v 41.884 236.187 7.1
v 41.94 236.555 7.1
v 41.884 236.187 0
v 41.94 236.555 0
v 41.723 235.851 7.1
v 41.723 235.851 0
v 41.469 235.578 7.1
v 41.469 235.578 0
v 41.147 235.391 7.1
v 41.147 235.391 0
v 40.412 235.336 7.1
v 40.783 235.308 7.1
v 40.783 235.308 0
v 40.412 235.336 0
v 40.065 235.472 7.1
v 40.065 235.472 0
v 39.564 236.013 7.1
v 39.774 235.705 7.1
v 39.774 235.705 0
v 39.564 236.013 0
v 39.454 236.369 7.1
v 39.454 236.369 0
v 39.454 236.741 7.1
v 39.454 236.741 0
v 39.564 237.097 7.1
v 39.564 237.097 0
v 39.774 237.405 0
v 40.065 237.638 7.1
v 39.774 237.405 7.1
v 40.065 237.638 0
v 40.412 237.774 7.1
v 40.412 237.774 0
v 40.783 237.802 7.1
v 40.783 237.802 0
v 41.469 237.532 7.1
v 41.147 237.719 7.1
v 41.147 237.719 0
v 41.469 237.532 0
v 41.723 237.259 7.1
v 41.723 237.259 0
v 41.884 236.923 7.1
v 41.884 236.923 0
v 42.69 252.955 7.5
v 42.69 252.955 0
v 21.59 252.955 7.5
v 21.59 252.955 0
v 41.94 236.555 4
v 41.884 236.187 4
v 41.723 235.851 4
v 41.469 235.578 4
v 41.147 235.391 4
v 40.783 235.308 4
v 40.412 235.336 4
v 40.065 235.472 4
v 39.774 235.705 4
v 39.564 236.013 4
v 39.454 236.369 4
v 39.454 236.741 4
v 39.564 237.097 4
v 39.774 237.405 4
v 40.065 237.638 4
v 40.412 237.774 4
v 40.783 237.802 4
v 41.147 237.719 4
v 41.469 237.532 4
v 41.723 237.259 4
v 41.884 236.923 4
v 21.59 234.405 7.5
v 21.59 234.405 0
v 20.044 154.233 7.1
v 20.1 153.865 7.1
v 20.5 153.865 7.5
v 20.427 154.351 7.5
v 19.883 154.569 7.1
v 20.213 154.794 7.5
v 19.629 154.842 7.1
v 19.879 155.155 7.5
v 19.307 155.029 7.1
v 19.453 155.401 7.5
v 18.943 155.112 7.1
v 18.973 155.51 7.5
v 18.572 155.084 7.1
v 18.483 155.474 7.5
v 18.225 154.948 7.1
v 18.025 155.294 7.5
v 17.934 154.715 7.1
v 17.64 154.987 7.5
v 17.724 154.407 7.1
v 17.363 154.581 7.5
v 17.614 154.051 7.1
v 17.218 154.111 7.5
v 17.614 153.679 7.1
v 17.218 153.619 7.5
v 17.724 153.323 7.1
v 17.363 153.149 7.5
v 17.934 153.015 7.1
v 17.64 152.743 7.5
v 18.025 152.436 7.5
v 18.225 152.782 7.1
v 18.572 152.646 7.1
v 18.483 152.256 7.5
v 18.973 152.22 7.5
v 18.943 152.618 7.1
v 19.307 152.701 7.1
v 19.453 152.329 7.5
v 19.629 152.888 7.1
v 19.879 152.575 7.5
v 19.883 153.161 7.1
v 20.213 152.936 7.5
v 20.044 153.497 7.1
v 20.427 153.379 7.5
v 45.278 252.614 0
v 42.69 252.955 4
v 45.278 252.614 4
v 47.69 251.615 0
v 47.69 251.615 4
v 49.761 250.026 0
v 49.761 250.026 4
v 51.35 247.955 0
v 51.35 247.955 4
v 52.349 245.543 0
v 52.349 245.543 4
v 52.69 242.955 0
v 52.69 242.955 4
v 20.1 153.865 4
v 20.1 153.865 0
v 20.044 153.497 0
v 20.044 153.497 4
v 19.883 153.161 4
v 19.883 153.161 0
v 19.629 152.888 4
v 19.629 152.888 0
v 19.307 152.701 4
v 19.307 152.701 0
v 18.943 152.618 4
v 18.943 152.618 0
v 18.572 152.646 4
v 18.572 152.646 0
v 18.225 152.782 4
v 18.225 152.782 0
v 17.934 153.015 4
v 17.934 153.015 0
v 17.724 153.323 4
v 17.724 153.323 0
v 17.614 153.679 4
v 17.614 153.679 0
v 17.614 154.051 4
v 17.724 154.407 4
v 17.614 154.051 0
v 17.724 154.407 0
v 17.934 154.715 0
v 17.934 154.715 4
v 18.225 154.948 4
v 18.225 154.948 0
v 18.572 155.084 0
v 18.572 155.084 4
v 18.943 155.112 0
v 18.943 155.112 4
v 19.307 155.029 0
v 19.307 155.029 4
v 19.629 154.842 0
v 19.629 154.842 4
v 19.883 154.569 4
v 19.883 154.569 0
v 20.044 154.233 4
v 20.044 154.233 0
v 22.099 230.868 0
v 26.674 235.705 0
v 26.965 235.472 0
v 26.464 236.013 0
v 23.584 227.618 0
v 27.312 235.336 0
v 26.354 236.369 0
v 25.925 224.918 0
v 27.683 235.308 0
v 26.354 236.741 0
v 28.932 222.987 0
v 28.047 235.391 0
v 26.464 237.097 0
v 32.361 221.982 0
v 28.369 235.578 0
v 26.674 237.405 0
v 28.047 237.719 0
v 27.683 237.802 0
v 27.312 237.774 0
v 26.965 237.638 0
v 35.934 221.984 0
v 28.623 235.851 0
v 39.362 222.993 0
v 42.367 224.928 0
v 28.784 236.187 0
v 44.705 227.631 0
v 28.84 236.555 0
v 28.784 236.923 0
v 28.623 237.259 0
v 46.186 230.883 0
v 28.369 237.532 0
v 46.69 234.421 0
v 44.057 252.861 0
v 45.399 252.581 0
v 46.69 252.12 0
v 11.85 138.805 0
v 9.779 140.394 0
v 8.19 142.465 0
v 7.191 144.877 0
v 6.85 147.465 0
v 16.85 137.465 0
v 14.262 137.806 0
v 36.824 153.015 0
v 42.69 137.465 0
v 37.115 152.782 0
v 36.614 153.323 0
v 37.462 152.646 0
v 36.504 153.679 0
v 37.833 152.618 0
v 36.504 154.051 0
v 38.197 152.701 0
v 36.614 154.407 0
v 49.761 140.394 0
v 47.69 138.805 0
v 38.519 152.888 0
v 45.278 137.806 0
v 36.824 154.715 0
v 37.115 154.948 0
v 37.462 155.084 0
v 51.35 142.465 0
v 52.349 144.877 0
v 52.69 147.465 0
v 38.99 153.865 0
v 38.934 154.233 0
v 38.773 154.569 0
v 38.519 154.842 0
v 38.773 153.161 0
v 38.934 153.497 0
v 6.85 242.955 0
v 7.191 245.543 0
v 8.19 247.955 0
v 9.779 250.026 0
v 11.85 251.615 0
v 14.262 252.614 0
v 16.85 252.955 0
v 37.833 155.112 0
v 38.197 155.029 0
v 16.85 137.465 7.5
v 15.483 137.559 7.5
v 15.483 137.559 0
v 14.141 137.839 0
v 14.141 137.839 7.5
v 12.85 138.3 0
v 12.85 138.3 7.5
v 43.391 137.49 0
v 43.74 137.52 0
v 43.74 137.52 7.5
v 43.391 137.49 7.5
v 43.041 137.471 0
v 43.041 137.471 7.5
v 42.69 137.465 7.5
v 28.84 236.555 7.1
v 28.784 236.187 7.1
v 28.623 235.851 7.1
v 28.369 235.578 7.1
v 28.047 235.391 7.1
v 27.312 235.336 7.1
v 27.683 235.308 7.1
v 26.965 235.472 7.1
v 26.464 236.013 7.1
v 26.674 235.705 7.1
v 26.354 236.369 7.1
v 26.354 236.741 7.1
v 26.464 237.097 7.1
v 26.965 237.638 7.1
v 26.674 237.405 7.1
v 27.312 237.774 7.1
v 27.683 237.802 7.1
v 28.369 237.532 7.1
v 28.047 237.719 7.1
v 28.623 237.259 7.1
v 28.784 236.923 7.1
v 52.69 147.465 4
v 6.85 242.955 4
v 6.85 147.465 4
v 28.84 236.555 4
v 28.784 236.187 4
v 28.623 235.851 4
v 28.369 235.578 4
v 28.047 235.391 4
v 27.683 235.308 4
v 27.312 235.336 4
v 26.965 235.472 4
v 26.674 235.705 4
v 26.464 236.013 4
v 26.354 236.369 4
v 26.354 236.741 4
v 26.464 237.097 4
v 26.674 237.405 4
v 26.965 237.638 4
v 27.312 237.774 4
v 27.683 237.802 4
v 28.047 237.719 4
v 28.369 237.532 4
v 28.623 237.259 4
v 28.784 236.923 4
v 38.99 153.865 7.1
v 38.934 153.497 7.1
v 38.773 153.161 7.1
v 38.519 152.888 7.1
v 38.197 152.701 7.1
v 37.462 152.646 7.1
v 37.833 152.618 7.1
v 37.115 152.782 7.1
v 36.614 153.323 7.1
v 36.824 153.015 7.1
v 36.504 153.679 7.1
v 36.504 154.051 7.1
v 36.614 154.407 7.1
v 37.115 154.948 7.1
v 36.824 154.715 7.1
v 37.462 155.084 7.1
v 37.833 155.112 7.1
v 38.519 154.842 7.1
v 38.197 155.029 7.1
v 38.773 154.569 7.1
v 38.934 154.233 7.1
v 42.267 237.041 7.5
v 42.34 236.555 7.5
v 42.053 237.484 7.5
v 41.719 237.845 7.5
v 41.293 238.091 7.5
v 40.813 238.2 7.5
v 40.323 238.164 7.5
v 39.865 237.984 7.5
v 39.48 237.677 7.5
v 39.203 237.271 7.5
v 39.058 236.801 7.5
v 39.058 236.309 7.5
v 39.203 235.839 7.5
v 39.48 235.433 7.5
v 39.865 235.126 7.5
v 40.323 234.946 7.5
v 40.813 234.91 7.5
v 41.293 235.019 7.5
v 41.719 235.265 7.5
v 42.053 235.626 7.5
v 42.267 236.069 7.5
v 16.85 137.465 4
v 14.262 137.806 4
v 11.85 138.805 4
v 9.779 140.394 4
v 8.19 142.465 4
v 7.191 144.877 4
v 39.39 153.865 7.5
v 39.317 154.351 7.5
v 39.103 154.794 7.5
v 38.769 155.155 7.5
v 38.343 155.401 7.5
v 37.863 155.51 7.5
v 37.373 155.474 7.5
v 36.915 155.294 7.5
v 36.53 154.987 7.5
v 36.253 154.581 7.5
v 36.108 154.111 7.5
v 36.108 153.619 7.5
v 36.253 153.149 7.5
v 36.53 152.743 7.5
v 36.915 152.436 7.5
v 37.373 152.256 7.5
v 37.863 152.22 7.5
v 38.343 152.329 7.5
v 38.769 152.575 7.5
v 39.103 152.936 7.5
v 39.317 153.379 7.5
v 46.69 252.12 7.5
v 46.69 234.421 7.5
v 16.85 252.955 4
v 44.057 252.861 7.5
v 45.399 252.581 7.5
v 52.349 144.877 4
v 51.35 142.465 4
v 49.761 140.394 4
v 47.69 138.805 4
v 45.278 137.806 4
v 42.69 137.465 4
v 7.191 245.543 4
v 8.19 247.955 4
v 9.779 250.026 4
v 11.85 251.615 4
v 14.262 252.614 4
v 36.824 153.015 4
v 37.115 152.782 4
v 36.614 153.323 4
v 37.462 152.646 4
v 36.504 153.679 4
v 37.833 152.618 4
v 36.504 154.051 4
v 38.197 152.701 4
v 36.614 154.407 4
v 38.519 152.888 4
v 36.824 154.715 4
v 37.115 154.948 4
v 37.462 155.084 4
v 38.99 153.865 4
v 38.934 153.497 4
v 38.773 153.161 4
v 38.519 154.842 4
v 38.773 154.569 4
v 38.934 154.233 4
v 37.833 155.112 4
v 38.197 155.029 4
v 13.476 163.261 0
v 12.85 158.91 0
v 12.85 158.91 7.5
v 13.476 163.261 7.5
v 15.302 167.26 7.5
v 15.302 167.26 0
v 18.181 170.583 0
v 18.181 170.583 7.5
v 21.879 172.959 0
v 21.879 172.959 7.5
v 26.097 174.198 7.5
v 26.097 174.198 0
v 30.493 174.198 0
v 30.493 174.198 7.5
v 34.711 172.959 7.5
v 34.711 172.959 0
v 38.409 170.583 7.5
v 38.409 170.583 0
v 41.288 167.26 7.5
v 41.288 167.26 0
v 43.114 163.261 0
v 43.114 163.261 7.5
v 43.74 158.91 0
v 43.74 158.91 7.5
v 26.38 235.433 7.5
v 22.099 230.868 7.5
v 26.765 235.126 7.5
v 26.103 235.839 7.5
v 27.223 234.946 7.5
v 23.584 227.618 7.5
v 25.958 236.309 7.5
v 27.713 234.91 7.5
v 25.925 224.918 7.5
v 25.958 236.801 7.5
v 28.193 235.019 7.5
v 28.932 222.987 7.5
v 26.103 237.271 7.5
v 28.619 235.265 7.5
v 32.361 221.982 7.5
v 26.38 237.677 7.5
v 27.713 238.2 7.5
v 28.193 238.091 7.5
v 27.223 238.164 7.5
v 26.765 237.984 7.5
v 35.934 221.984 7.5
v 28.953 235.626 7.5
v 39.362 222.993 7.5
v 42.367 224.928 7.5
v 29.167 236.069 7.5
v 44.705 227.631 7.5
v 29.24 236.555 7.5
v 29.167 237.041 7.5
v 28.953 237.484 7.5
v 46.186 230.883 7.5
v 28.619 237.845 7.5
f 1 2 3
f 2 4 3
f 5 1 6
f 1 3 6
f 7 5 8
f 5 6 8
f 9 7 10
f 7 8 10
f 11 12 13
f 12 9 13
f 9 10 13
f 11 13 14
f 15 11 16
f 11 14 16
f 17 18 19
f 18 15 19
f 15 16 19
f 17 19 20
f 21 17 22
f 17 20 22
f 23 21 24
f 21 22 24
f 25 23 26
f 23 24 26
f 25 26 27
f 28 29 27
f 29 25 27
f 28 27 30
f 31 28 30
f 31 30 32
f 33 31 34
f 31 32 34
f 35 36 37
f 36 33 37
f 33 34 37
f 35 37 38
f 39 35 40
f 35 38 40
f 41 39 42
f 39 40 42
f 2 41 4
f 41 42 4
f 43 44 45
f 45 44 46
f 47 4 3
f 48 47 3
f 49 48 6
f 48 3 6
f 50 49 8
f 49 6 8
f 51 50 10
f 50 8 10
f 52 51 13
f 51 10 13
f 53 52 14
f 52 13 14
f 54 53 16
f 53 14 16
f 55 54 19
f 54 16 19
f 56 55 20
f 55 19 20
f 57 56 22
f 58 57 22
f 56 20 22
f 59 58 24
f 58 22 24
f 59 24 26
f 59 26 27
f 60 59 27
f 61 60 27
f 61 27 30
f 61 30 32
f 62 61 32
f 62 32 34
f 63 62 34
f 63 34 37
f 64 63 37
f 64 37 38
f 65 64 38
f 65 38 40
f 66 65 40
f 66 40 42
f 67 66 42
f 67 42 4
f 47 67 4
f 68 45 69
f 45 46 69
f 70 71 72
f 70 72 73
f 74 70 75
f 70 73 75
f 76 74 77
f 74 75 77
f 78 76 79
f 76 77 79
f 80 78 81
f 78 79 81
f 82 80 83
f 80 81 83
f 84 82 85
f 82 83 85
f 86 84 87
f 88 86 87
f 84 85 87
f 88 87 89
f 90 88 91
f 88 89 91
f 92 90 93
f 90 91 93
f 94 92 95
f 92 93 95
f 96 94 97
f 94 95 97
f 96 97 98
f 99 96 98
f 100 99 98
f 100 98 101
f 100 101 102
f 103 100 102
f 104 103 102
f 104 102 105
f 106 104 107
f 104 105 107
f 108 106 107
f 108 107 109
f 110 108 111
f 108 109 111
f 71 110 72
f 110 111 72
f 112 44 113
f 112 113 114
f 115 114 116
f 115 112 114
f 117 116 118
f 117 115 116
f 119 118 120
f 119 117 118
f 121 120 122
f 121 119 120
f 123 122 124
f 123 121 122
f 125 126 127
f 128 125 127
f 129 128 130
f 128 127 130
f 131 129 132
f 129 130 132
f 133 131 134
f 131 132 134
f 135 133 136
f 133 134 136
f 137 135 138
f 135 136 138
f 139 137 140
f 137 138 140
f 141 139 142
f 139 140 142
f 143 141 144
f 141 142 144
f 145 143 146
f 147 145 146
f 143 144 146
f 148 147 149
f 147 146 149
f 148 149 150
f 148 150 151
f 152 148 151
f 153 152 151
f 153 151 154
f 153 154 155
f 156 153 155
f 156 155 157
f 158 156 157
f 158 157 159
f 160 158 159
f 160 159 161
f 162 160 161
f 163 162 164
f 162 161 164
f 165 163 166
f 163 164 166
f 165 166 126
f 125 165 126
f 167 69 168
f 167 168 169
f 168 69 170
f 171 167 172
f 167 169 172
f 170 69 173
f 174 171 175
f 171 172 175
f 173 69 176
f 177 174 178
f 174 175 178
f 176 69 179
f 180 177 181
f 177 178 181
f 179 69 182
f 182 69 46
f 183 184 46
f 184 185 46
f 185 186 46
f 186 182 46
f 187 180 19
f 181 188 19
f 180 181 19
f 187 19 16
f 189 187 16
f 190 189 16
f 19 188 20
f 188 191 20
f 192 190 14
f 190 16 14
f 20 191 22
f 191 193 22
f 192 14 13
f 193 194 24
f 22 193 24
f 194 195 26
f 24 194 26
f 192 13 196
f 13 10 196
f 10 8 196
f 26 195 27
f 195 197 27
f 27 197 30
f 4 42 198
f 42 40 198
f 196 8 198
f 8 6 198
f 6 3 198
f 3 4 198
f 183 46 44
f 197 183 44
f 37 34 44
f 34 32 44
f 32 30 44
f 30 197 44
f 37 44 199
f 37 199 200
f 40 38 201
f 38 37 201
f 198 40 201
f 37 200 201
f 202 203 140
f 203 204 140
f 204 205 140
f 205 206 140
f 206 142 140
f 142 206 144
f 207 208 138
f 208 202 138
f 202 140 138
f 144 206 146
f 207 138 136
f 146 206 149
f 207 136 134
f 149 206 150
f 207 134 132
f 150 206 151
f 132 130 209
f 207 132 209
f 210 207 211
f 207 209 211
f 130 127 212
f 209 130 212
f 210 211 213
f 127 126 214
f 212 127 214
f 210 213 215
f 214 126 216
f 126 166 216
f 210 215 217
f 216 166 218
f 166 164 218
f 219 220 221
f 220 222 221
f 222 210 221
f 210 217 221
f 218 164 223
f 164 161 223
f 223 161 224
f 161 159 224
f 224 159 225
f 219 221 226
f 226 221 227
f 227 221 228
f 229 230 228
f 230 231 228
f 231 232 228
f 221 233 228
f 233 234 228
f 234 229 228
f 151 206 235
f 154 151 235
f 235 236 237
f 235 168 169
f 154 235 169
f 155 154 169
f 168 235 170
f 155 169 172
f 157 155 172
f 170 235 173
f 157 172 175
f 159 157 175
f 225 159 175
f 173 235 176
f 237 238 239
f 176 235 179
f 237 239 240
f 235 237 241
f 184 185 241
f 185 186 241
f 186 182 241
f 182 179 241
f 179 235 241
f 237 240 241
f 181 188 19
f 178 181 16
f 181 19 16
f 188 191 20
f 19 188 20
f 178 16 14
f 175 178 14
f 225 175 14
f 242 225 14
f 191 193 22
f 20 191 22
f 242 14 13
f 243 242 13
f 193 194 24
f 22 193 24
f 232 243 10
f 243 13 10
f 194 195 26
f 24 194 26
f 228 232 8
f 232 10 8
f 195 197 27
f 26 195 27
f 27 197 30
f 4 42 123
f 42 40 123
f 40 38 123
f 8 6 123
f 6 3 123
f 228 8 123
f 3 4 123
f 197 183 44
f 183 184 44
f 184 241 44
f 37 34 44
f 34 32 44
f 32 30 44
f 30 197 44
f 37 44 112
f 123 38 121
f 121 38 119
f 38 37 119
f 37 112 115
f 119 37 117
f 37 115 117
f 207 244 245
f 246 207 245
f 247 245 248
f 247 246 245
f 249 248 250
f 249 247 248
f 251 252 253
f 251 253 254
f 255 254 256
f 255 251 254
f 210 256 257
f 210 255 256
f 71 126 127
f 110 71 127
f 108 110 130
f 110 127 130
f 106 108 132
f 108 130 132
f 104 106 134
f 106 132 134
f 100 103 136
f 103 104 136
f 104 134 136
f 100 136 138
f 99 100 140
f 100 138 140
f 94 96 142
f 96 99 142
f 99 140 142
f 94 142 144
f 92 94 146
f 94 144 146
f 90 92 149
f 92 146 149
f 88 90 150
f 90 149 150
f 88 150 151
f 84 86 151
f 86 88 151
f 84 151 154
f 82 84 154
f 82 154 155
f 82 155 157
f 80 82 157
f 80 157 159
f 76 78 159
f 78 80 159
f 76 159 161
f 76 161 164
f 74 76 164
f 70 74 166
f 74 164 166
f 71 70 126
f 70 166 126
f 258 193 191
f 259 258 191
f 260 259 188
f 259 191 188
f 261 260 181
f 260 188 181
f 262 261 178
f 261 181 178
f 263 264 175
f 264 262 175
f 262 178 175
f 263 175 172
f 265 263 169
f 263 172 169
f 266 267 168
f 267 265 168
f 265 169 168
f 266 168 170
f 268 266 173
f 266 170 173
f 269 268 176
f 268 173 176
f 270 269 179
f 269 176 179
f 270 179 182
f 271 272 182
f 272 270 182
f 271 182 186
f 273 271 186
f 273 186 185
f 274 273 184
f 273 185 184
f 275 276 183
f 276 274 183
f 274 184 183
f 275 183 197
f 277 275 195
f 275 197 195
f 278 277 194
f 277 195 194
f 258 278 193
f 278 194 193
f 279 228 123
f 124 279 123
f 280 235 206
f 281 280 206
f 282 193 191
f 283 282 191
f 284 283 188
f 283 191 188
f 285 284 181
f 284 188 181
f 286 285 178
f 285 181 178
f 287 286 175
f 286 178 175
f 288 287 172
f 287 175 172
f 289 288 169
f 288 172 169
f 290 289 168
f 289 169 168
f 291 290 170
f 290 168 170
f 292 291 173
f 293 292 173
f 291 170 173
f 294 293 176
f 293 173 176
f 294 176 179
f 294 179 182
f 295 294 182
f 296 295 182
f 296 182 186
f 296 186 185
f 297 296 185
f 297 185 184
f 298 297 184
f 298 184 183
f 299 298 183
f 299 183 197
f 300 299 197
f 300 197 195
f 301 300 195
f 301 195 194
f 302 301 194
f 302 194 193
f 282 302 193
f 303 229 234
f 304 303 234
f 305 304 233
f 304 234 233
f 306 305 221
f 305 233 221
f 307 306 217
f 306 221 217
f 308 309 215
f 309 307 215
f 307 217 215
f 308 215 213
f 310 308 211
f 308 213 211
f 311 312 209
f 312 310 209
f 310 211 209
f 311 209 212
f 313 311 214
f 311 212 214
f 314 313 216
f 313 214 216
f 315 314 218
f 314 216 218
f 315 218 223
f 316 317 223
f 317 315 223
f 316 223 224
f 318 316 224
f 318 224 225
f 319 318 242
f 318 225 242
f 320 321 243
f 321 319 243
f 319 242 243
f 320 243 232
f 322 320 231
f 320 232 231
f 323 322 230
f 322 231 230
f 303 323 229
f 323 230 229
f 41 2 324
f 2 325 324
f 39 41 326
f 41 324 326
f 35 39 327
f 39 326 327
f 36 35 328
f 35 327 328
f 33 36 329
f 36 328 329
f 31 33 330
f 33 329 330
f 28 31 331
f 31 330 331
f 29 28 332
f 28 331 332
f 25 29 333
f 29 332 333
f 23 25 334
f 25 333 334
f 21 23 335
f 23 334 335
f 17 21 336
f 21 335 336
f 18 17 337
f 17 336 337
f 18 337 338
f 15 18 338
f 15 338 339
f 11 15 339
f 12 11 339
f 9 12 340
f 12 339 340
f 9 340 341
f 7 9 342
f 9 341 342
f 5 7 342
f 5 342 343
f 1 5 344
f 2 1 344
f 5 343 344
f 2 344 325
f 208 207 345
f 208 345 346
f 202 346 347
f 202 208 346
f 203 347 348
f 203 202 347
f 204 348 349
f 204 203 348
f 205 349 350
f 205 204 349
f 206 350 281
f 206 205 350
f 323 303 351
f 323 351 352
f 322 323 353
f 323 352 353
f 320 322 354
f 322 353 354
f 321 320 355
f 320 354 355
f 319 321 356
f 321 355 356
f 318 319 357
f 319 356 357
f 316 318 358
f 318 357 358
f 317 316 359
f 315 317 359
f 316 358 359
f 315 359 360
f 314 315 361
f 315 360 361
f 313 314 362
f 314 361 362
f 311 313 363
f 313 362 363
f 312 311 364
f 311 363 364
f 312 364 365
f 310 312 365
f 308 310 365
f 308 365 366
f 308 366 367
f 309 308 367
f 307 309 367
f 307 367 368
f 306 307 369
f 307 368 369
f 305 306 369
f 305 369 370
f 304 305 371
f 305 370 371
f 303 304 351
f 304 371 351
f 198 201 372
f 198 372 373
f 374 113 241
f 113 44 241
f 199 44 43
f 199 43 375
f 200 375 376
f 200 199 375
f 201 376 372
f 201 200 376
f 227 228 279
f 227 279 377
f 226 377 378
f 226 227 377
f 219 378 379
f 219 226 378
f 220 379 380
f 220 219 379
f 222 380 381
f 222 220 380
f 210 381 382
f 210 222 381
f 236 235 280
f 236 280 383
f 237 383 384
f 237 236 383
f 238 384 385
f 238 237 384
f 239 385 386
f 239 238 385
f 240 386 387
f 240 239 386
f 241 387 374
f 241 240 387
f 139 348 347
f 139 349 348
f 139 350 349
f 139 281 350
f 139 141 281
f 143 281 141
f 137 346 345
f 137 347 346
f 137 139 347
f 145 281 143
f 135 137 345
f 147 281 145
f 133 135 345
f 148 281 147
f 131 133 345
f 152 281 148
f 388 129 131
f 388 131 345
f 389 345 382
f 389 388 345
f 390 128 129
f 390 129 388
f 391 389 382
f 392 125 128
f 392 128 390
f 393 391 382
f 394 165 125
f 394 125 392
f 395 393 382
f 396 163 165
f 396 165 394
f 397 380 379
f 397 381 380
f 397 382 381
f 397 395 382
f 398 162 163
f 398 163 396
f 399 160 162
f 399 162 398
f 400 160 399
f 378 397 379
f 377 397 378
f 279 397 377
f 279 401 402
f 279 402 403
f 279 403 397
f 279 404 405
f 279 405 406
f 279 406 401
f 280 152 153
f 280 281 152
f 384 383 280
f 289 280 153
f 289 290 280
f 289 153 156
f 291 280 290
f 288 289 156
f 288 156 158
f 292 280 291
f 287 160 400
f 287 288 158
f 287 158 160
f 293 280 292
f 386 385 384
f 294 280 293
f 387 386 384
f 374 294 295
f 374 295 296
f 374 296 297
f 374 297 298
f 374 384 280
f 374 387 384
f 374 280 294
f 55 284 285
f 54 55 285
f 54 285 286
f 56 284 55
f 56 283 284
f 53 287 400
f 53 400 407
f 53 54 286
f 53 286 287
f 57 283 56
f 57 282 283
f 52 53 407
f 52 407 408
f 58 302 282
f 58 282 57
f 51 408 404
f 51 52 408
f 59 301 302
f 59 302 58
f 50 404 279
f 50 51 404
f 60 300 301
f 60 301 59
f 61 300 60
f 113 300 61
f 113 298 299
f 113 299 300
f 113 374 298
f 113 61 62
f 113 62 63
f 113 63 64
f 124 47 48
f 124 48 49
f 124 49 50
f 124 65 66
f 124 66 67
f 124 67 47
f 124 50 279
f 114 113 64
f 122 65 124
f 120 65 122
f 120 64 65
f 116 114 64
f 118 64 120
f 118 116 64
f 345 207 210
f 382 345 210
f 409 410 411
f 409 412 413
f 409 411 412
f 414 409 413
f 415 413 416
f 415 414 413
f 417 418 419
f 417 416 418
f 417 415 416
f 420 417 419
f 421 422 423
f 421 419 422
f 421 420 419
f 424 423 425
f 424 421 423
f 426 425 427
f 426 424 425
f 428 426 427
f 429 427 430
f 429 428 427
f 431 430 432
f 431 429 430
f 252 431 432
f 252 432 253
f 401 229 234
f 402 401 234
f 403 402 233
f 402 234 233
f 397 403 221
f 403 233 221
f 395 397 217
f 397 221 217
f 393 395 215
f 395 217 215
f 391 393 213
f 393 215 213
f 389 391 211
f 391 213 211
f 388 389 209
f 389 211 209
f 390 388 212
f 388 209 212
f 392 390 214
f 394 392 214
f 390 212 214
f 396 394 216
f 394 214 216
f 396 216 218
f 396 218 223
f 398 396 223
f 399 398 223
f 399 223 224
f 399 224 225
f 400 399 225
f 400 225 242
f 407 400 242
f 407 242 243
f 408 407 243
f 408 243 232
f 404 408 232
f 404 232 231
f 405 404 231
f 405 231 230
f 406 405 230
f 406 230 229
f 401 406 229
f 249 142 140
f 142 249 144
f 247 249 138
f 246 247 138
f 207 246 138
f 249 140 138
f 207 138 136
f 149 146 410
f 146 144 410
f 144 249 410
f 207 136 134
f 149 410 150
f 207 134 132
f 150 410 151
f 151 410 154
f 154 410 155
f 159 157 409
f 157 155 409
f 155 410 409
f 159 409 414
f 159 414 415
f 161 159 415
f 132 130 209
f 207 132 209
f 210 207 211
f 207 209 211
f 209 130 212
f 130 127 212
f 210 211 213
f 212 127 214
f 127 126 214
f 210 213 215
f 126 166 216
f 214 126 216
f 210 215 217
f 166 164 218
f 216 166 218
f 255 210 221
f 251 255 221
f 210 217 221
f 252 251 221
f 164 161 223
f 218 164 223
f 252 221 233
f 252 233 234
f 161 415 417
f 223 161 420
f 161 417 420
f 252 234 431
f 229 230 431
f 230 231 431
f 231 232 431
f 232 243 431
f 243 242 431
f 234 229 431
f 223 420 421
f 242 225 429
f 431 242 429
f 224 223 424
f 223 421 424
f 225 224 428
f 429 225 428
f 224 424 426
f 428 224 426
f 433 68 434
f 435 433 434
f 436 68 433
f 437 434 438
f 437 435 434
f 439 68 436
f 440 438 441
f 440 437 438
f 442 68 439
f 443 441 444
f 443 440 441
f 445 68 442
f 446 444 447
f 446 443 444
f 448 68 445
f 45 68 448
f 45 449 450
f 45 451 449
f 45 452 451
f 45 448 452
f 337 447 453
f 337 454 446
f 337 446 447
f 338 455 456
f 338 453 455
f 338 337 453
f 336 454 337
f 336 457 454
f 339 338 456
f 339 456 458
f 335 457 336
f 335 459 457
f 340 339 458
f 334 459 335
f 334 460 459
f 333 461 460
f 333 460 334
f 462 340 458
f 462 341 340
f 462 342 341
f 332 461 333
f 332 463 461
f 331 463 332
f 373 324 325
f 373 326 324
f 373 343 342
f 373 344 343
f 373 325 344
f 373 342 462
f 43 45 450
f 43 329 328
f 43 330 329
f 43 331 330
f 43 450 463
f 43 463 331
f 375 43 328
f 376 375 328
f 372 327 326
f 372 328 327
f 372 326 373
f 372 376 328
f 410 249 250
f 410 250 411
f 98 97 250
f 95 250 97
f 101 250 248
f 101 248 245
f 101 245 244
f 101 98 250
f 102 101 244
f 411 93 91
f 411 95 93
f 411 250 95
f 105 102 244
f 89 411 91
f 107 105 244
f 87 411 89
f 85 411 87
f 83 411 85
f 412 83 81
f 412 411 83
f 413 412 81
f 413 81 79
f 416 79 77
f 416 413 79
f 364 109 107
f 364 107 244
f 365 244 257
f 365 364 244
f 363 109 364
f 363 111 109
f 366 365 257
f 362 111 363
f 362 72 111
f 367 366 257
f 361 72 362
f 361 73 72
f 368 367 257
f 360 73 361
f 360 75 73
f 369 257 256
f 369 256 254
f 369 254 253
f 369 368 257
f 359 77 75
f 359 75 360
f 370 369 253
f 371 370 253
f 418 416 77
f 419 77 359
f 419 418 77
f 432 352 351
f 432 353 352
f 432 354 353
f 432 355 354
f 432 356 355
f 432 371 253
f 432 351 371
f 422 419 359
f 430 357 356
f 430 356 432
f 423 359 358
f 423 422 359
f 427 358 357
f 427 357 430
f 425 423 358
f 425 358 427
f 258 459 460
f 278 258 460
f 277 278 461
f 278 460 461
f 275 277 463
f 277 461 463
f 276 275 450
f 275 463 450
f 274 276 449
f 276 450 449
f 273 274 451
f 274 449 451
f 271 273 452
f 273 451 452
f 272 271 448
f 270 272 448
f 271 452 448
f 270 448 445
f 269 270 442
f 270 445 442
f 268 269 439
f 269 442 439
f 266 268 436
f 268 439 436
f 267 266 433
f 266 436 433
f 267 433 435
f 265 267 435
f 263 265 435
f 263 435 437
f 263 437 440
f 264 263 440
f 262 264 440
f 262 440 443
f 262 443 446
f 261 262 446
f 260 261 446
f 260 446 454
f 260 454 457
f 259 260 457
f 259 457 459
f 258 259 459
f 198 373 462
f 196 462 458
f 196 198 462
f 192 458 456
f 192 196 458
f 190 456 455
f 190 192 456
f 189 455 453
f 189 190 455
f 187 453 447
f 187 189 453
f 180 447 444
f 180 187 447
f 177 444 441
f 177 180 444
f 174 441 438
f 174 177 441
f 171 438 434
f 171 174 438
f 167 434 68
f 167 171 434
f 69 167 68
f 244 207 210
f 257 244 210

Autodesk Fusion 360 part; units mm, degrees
sketch "Sketch1" plane through (0, 0, 0) normal (0, 0, 1) x (1, 0, 0)
  line L0 (0, 0) -> (0, 440.8206) construction
  circle A0 centre (28.295, 158.91) radius 15.445
  circle A1 centre (34.14, 234.405) radius 12.55
  line L1 (21.59, 252.955) -> (21.59, 225.1955) construction
  line L2 (12.85, 148.5568) -> (12.85, 96.1739) construction
  line L3 (44.5202, 221.855) -> (24.6627, 221.855) construction
  line L4 (16.1034, 174.355) -> (40, 174.355) construction
  line L5 (42.69, 252.955) -> (16.85, 252.955)
  line L6 (6.85, 242.955) -> (6.85, 147.465)
  line L7 (16.85, 137.465) -> (42.69, 137.465)
  line L8 (52.69, 147.465) -> (52.69, 242.955)
  line L9 (46.69, 252.1202) -> (46.69, 234.4206) construction
  line L10 (27.1067, 246.955) -> (40, 246.955) construction
  line L11 (19.6603, 143.465) -> (42.4959, 143.465) construction
  arc A2 (16.85, 252.955) -> (6.85, 242.955) centre (16.85, 242.955) ccw
  arc A3 (42.69, 137.465) -> (52.69, 147.465) centre (42.69, 147.465) ccw
  arc A4 (52.69, 242.955) -> (42.69, 252.955) centre (42.69, 242.955) ccw
  arc A5 (6.85, 147.465) -> (16.85, 137.465) centre (16.85, 147.465) ccw
  line L12 (21.59, 252.955) -> (21.59, 234.405)
  line L13 (46.69, 252.1202) -> (46.69, 234.4206)
  line L14 (12.85, 138.2999) -> (12.85, 158.91)
  line L15 (43.74, 158.91) -> (43.74, 137.465)
  circle A6 centre (18.85, 153.865) radius 1.25
  line L16 (28.295, 158.91) -> (28.295, 137.465)
  circle A7 centre (37.74, 153.865) radius 1.25
  circle A8 centre (40.69, 236.555) radius 1.25
  line L17 (34.14, 234.405) -> (34.14, 252.955)
  circle A9 centre (27.59, 236.555) radius 1.25
  dimension "d1" = 30.89
  dimension "d2" = 25.1
  dimension "d3" = 21.59
  dimension "d4" = 12.85
  dimension "d5" = 47.5
  dimension "d6" = 6
  dimension "d7" = 6
  dimension "d8" = 6
  dimension "d9" = 6
  dimension "d10" = 10
  dimension "d11" = 10
  dimension "d12" = 10
  dimension "d19" = 2.5
  dimension "d20" = 16.4
  dimension "d21" = 12
  dimension "d22" = 2.5
  dimension "d23" = 12
  dimension "d24" = 16.4
extrude "Extrude1" add sketch "Sketch1" along normal blind 4 contours A0 | A0 L7 A3 L15 L16 | A0 A1 L5 L6 L8 A2 A3 A4 A5 L12 L13 L14 L15 | A0 L7 A5 L14 L16 | A1 L5 A4 L13 L17 | A1 | A1 L5 L12 L17 | A6 | A7 | A8 | A9 makes body 1
extrude "Extrude2" add sketch "Sketch1" along normal blind 7.5 separate body contours A1 L5 A4 L13 L17 | A1 | A1 L5 L12 L17 | A8 | A9 makes body 2
extrude "Extrude3" add sketch "Sketch1" along normal blind 7.5 separate body contours A0 | A0 L7 A3 L15 L16 | A0 L7 A5 L14 L16 | A6 | A7 makes body 3
extrude "Extrude4" cut sketch "Sketch1" along normal up to surface (7.5 mm away) contours A6 | A7 | A8 | A9 bodies 1 2 3
chamfer "Chamfer1" distance 0.4 angle 45 4 edges at (26.4246, 237.007, 7.5) (39.5246, 237.007, 7.5) (17.6846, 154.317, 7.5) (36.5746, 154.317, 7.5) on bodies 2 3
